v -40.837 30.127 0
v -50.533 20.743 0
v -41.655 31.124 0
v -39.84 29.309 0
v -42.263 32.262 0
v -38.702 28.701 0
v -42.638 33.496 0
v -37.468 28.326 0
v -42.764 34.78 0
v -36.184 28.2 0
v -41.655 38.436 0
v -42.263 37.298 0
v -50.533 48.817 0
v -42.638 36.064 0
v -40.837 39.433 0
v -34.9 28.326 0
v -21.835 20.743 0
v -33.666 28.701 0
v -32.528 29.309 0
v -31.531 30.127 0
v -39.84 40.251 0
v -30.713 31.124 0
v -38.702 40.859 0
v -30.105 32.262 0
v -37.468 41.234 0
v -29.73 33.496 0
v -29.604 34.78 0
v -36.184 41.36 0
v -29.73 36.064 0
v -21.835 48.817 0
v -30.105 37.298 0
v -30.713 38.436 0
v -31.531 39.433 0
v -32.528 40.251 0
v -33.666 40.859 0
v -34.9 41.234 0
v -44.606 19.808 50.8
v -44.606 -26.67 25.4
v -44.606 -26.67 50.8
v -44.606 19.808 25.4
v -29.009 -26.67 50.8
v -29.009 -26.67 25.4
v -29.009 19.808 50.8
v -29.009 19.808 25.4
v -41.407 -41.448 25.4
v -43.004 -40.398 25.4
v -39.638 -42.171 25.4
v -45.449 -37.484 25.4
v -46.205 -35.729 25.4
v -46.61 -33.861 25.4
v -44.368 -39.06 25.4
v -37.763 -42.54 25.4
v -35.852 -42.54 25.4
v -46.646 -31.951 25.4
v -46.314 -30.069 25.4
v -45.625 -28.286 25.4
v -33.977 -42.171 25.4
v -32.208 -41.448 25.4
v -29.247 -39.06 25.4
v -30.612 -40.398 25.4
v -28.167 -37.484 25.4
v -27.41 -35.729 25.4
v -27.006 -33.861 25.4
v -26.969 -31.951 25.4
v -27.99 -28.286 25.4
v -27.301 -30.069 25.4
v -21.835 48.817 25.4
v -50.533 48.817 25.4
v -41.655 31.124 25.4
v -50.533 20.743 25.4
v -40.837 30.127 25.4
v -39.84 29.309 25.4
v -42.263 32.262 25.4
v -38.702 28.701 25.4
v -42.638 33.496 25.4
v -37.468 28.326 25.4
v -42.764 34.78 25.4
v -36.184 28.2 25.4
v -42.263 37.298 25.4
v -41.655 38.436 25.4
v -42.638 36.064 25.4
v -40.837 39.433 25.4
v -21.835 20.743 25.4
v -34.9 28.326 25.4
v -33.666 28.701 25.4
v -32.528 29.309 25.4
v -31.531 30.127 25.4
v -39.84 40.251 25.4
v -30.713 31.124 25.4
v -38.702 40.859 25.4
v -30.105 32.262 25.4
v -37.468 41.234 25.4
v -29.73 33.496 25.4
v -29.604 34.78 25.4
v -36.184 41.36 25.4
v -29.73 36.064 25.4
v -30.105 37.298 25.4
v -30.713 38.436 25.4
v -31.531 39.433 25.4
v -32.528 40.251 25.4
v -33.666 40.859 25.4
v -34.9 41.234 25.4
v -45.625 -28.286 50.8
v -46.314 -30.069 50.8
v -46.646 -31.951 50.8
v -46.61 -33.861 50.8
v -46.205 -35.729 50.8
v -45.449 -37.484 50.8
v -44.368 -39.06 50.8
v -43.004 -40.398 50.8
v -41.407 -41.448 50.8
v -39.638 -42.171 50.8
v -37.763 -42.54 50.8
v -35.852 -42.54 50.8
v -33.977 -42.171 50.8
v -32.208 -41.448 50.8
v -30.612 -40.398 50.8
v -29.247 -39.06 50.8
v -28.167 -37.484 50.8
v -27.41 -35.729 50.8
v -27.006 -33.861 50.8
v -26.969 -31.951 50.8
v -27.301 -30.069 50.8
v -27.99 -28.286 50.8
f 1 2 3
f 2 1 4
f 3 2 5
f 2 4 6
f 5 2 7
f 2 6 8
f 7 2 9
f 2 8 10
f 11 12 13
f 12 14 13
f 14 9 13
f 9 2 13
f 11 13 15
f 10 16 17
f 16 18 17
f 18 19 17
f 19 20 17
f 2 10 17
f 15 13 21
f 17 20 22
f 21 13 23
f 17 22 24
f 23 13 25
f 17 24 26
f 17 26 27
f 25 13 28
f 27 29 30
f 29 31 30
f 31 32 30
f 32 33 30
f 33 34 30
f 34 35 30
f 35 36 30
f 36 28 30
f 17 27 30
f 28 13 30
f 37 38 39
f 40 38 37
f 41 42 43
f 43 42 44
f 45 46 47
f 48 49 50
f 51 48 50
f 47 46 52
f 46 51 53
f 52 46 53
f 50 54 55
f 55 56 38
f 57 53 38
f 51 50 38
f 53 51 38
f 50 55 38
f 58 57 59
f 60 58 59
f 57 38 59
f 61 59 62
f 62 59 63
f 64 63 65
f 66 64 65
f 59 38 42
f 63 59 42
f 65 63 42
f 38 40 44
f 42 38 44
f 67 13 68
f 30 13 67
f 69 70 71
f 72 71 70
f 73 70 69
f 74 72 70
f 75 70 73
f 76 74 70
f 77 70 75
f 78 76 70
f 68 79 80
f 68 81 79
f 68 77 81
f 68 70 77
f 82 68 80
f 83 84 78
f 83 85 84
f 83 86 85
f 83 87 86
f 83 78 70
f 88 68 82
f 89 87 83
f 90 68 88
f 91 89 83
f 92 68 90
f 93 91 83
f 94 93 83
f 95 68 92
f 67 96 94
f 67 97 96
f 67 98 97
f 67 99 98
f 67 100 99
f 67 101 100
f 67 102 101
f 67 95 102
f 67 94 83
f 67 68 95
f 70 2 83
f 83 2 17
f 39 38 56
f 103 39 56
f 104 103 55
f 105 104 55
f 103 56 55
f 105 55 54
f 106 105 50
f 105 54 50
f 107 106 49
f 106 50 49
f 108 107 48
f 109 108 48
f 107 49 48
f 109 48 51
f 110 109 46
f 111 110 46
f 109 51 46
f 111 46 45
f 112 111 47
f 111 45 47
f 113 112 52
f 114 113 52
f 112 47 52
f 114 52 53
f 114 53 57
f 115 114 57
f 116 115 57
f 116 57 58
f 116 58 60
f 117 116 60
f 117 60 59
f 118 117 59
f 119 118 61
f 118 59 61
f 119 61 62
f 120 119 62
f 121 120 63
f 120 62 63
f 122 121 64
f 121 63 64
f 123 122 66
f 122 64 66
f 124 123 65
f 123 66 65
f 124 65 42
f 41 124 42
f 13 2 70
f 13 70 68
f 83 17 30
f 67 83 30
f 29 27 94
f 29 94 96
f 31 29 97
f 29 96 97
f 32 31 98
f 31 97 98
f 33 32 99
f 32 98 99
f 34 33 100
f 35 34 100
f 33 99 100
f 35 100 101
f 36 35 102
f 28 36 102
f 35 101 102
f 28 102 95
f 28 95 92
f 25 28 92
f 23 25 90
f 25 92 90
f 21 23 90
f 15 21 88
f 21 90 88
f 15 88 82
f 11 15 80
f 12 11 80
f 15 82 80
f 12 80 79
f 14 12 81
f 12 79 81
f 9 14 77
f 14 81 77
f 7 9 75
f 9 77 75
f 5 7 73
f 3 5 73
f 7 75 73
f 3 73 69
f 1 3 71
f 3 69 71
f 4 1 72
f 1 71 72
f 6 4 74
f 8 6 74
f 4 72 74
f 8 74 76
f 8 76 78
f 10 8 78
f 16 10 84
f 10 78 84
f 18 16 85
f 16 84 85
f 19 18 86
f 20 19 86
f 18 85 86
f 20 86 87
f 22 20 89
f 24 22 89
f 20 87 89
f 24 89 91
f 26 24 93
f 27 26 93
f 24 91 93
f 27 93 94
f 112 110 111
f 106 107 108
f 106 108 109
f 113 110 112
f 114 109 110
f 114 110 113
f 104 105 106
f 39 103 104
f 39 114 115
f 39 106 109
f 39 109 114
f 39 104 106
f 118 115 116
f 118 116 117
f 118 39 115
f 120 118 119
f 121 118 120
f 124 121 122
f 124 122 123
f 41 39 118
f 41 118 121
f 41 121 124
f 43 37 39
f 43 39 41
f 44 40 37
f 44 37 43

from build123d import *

# Parameters (mm, degrees)
F0_W     = 28.6975428462
F0_H     = 28.0736833811
F1_DEPTH = 25.4
F2_R     = 6.580164917
F3_DEPTH = 25.4
F5_W     = 15.596492216
F5_H     = 46.4775450528
F6_DEPTH = 25.4


with BuildPart() as f1:
    # F0 (on Top) → F1 (new body)
    with BuildSketch(Plane.XY):
        with Locations((-36.183860153, 34.7801744938)):
            Rectangle(F0_W, F0_H)
    extrude(amount=F1_DEPTH)

    # F2 (on face) → F3 (cut, through all)
    with BuildSketch(Plane.XY.offset(25.4)):
        with Locations((-36.183860153, 34.7801744938)):
            Circle(F2_R)
    extrude(amount=-F3_DEPTH, mode=Mode.SUBTRACT)


with BuildPart() as f6:
    # F5 (on offset) → F6 (new body)
    with BuildSketch(Plane.XY.offset(25.4)):
        with Locations((-36.8077205494, -3.4312289208)):
            Rectangle(F5_W, F5_H)
        with BuildLine():
            Line((-29.0094744414, -26.6700014472), (-44.6059666574, -26.6700014472))
            ThreePointArc((-44.6059666574, -26.6700014472), (-36.8077205494, -42.5859439403), (-29.0094744414, -26.6700014472))
        make_face()
    extrude(amount=F6_DEPTH)


solid = Compound([f1.part, f6.part])
